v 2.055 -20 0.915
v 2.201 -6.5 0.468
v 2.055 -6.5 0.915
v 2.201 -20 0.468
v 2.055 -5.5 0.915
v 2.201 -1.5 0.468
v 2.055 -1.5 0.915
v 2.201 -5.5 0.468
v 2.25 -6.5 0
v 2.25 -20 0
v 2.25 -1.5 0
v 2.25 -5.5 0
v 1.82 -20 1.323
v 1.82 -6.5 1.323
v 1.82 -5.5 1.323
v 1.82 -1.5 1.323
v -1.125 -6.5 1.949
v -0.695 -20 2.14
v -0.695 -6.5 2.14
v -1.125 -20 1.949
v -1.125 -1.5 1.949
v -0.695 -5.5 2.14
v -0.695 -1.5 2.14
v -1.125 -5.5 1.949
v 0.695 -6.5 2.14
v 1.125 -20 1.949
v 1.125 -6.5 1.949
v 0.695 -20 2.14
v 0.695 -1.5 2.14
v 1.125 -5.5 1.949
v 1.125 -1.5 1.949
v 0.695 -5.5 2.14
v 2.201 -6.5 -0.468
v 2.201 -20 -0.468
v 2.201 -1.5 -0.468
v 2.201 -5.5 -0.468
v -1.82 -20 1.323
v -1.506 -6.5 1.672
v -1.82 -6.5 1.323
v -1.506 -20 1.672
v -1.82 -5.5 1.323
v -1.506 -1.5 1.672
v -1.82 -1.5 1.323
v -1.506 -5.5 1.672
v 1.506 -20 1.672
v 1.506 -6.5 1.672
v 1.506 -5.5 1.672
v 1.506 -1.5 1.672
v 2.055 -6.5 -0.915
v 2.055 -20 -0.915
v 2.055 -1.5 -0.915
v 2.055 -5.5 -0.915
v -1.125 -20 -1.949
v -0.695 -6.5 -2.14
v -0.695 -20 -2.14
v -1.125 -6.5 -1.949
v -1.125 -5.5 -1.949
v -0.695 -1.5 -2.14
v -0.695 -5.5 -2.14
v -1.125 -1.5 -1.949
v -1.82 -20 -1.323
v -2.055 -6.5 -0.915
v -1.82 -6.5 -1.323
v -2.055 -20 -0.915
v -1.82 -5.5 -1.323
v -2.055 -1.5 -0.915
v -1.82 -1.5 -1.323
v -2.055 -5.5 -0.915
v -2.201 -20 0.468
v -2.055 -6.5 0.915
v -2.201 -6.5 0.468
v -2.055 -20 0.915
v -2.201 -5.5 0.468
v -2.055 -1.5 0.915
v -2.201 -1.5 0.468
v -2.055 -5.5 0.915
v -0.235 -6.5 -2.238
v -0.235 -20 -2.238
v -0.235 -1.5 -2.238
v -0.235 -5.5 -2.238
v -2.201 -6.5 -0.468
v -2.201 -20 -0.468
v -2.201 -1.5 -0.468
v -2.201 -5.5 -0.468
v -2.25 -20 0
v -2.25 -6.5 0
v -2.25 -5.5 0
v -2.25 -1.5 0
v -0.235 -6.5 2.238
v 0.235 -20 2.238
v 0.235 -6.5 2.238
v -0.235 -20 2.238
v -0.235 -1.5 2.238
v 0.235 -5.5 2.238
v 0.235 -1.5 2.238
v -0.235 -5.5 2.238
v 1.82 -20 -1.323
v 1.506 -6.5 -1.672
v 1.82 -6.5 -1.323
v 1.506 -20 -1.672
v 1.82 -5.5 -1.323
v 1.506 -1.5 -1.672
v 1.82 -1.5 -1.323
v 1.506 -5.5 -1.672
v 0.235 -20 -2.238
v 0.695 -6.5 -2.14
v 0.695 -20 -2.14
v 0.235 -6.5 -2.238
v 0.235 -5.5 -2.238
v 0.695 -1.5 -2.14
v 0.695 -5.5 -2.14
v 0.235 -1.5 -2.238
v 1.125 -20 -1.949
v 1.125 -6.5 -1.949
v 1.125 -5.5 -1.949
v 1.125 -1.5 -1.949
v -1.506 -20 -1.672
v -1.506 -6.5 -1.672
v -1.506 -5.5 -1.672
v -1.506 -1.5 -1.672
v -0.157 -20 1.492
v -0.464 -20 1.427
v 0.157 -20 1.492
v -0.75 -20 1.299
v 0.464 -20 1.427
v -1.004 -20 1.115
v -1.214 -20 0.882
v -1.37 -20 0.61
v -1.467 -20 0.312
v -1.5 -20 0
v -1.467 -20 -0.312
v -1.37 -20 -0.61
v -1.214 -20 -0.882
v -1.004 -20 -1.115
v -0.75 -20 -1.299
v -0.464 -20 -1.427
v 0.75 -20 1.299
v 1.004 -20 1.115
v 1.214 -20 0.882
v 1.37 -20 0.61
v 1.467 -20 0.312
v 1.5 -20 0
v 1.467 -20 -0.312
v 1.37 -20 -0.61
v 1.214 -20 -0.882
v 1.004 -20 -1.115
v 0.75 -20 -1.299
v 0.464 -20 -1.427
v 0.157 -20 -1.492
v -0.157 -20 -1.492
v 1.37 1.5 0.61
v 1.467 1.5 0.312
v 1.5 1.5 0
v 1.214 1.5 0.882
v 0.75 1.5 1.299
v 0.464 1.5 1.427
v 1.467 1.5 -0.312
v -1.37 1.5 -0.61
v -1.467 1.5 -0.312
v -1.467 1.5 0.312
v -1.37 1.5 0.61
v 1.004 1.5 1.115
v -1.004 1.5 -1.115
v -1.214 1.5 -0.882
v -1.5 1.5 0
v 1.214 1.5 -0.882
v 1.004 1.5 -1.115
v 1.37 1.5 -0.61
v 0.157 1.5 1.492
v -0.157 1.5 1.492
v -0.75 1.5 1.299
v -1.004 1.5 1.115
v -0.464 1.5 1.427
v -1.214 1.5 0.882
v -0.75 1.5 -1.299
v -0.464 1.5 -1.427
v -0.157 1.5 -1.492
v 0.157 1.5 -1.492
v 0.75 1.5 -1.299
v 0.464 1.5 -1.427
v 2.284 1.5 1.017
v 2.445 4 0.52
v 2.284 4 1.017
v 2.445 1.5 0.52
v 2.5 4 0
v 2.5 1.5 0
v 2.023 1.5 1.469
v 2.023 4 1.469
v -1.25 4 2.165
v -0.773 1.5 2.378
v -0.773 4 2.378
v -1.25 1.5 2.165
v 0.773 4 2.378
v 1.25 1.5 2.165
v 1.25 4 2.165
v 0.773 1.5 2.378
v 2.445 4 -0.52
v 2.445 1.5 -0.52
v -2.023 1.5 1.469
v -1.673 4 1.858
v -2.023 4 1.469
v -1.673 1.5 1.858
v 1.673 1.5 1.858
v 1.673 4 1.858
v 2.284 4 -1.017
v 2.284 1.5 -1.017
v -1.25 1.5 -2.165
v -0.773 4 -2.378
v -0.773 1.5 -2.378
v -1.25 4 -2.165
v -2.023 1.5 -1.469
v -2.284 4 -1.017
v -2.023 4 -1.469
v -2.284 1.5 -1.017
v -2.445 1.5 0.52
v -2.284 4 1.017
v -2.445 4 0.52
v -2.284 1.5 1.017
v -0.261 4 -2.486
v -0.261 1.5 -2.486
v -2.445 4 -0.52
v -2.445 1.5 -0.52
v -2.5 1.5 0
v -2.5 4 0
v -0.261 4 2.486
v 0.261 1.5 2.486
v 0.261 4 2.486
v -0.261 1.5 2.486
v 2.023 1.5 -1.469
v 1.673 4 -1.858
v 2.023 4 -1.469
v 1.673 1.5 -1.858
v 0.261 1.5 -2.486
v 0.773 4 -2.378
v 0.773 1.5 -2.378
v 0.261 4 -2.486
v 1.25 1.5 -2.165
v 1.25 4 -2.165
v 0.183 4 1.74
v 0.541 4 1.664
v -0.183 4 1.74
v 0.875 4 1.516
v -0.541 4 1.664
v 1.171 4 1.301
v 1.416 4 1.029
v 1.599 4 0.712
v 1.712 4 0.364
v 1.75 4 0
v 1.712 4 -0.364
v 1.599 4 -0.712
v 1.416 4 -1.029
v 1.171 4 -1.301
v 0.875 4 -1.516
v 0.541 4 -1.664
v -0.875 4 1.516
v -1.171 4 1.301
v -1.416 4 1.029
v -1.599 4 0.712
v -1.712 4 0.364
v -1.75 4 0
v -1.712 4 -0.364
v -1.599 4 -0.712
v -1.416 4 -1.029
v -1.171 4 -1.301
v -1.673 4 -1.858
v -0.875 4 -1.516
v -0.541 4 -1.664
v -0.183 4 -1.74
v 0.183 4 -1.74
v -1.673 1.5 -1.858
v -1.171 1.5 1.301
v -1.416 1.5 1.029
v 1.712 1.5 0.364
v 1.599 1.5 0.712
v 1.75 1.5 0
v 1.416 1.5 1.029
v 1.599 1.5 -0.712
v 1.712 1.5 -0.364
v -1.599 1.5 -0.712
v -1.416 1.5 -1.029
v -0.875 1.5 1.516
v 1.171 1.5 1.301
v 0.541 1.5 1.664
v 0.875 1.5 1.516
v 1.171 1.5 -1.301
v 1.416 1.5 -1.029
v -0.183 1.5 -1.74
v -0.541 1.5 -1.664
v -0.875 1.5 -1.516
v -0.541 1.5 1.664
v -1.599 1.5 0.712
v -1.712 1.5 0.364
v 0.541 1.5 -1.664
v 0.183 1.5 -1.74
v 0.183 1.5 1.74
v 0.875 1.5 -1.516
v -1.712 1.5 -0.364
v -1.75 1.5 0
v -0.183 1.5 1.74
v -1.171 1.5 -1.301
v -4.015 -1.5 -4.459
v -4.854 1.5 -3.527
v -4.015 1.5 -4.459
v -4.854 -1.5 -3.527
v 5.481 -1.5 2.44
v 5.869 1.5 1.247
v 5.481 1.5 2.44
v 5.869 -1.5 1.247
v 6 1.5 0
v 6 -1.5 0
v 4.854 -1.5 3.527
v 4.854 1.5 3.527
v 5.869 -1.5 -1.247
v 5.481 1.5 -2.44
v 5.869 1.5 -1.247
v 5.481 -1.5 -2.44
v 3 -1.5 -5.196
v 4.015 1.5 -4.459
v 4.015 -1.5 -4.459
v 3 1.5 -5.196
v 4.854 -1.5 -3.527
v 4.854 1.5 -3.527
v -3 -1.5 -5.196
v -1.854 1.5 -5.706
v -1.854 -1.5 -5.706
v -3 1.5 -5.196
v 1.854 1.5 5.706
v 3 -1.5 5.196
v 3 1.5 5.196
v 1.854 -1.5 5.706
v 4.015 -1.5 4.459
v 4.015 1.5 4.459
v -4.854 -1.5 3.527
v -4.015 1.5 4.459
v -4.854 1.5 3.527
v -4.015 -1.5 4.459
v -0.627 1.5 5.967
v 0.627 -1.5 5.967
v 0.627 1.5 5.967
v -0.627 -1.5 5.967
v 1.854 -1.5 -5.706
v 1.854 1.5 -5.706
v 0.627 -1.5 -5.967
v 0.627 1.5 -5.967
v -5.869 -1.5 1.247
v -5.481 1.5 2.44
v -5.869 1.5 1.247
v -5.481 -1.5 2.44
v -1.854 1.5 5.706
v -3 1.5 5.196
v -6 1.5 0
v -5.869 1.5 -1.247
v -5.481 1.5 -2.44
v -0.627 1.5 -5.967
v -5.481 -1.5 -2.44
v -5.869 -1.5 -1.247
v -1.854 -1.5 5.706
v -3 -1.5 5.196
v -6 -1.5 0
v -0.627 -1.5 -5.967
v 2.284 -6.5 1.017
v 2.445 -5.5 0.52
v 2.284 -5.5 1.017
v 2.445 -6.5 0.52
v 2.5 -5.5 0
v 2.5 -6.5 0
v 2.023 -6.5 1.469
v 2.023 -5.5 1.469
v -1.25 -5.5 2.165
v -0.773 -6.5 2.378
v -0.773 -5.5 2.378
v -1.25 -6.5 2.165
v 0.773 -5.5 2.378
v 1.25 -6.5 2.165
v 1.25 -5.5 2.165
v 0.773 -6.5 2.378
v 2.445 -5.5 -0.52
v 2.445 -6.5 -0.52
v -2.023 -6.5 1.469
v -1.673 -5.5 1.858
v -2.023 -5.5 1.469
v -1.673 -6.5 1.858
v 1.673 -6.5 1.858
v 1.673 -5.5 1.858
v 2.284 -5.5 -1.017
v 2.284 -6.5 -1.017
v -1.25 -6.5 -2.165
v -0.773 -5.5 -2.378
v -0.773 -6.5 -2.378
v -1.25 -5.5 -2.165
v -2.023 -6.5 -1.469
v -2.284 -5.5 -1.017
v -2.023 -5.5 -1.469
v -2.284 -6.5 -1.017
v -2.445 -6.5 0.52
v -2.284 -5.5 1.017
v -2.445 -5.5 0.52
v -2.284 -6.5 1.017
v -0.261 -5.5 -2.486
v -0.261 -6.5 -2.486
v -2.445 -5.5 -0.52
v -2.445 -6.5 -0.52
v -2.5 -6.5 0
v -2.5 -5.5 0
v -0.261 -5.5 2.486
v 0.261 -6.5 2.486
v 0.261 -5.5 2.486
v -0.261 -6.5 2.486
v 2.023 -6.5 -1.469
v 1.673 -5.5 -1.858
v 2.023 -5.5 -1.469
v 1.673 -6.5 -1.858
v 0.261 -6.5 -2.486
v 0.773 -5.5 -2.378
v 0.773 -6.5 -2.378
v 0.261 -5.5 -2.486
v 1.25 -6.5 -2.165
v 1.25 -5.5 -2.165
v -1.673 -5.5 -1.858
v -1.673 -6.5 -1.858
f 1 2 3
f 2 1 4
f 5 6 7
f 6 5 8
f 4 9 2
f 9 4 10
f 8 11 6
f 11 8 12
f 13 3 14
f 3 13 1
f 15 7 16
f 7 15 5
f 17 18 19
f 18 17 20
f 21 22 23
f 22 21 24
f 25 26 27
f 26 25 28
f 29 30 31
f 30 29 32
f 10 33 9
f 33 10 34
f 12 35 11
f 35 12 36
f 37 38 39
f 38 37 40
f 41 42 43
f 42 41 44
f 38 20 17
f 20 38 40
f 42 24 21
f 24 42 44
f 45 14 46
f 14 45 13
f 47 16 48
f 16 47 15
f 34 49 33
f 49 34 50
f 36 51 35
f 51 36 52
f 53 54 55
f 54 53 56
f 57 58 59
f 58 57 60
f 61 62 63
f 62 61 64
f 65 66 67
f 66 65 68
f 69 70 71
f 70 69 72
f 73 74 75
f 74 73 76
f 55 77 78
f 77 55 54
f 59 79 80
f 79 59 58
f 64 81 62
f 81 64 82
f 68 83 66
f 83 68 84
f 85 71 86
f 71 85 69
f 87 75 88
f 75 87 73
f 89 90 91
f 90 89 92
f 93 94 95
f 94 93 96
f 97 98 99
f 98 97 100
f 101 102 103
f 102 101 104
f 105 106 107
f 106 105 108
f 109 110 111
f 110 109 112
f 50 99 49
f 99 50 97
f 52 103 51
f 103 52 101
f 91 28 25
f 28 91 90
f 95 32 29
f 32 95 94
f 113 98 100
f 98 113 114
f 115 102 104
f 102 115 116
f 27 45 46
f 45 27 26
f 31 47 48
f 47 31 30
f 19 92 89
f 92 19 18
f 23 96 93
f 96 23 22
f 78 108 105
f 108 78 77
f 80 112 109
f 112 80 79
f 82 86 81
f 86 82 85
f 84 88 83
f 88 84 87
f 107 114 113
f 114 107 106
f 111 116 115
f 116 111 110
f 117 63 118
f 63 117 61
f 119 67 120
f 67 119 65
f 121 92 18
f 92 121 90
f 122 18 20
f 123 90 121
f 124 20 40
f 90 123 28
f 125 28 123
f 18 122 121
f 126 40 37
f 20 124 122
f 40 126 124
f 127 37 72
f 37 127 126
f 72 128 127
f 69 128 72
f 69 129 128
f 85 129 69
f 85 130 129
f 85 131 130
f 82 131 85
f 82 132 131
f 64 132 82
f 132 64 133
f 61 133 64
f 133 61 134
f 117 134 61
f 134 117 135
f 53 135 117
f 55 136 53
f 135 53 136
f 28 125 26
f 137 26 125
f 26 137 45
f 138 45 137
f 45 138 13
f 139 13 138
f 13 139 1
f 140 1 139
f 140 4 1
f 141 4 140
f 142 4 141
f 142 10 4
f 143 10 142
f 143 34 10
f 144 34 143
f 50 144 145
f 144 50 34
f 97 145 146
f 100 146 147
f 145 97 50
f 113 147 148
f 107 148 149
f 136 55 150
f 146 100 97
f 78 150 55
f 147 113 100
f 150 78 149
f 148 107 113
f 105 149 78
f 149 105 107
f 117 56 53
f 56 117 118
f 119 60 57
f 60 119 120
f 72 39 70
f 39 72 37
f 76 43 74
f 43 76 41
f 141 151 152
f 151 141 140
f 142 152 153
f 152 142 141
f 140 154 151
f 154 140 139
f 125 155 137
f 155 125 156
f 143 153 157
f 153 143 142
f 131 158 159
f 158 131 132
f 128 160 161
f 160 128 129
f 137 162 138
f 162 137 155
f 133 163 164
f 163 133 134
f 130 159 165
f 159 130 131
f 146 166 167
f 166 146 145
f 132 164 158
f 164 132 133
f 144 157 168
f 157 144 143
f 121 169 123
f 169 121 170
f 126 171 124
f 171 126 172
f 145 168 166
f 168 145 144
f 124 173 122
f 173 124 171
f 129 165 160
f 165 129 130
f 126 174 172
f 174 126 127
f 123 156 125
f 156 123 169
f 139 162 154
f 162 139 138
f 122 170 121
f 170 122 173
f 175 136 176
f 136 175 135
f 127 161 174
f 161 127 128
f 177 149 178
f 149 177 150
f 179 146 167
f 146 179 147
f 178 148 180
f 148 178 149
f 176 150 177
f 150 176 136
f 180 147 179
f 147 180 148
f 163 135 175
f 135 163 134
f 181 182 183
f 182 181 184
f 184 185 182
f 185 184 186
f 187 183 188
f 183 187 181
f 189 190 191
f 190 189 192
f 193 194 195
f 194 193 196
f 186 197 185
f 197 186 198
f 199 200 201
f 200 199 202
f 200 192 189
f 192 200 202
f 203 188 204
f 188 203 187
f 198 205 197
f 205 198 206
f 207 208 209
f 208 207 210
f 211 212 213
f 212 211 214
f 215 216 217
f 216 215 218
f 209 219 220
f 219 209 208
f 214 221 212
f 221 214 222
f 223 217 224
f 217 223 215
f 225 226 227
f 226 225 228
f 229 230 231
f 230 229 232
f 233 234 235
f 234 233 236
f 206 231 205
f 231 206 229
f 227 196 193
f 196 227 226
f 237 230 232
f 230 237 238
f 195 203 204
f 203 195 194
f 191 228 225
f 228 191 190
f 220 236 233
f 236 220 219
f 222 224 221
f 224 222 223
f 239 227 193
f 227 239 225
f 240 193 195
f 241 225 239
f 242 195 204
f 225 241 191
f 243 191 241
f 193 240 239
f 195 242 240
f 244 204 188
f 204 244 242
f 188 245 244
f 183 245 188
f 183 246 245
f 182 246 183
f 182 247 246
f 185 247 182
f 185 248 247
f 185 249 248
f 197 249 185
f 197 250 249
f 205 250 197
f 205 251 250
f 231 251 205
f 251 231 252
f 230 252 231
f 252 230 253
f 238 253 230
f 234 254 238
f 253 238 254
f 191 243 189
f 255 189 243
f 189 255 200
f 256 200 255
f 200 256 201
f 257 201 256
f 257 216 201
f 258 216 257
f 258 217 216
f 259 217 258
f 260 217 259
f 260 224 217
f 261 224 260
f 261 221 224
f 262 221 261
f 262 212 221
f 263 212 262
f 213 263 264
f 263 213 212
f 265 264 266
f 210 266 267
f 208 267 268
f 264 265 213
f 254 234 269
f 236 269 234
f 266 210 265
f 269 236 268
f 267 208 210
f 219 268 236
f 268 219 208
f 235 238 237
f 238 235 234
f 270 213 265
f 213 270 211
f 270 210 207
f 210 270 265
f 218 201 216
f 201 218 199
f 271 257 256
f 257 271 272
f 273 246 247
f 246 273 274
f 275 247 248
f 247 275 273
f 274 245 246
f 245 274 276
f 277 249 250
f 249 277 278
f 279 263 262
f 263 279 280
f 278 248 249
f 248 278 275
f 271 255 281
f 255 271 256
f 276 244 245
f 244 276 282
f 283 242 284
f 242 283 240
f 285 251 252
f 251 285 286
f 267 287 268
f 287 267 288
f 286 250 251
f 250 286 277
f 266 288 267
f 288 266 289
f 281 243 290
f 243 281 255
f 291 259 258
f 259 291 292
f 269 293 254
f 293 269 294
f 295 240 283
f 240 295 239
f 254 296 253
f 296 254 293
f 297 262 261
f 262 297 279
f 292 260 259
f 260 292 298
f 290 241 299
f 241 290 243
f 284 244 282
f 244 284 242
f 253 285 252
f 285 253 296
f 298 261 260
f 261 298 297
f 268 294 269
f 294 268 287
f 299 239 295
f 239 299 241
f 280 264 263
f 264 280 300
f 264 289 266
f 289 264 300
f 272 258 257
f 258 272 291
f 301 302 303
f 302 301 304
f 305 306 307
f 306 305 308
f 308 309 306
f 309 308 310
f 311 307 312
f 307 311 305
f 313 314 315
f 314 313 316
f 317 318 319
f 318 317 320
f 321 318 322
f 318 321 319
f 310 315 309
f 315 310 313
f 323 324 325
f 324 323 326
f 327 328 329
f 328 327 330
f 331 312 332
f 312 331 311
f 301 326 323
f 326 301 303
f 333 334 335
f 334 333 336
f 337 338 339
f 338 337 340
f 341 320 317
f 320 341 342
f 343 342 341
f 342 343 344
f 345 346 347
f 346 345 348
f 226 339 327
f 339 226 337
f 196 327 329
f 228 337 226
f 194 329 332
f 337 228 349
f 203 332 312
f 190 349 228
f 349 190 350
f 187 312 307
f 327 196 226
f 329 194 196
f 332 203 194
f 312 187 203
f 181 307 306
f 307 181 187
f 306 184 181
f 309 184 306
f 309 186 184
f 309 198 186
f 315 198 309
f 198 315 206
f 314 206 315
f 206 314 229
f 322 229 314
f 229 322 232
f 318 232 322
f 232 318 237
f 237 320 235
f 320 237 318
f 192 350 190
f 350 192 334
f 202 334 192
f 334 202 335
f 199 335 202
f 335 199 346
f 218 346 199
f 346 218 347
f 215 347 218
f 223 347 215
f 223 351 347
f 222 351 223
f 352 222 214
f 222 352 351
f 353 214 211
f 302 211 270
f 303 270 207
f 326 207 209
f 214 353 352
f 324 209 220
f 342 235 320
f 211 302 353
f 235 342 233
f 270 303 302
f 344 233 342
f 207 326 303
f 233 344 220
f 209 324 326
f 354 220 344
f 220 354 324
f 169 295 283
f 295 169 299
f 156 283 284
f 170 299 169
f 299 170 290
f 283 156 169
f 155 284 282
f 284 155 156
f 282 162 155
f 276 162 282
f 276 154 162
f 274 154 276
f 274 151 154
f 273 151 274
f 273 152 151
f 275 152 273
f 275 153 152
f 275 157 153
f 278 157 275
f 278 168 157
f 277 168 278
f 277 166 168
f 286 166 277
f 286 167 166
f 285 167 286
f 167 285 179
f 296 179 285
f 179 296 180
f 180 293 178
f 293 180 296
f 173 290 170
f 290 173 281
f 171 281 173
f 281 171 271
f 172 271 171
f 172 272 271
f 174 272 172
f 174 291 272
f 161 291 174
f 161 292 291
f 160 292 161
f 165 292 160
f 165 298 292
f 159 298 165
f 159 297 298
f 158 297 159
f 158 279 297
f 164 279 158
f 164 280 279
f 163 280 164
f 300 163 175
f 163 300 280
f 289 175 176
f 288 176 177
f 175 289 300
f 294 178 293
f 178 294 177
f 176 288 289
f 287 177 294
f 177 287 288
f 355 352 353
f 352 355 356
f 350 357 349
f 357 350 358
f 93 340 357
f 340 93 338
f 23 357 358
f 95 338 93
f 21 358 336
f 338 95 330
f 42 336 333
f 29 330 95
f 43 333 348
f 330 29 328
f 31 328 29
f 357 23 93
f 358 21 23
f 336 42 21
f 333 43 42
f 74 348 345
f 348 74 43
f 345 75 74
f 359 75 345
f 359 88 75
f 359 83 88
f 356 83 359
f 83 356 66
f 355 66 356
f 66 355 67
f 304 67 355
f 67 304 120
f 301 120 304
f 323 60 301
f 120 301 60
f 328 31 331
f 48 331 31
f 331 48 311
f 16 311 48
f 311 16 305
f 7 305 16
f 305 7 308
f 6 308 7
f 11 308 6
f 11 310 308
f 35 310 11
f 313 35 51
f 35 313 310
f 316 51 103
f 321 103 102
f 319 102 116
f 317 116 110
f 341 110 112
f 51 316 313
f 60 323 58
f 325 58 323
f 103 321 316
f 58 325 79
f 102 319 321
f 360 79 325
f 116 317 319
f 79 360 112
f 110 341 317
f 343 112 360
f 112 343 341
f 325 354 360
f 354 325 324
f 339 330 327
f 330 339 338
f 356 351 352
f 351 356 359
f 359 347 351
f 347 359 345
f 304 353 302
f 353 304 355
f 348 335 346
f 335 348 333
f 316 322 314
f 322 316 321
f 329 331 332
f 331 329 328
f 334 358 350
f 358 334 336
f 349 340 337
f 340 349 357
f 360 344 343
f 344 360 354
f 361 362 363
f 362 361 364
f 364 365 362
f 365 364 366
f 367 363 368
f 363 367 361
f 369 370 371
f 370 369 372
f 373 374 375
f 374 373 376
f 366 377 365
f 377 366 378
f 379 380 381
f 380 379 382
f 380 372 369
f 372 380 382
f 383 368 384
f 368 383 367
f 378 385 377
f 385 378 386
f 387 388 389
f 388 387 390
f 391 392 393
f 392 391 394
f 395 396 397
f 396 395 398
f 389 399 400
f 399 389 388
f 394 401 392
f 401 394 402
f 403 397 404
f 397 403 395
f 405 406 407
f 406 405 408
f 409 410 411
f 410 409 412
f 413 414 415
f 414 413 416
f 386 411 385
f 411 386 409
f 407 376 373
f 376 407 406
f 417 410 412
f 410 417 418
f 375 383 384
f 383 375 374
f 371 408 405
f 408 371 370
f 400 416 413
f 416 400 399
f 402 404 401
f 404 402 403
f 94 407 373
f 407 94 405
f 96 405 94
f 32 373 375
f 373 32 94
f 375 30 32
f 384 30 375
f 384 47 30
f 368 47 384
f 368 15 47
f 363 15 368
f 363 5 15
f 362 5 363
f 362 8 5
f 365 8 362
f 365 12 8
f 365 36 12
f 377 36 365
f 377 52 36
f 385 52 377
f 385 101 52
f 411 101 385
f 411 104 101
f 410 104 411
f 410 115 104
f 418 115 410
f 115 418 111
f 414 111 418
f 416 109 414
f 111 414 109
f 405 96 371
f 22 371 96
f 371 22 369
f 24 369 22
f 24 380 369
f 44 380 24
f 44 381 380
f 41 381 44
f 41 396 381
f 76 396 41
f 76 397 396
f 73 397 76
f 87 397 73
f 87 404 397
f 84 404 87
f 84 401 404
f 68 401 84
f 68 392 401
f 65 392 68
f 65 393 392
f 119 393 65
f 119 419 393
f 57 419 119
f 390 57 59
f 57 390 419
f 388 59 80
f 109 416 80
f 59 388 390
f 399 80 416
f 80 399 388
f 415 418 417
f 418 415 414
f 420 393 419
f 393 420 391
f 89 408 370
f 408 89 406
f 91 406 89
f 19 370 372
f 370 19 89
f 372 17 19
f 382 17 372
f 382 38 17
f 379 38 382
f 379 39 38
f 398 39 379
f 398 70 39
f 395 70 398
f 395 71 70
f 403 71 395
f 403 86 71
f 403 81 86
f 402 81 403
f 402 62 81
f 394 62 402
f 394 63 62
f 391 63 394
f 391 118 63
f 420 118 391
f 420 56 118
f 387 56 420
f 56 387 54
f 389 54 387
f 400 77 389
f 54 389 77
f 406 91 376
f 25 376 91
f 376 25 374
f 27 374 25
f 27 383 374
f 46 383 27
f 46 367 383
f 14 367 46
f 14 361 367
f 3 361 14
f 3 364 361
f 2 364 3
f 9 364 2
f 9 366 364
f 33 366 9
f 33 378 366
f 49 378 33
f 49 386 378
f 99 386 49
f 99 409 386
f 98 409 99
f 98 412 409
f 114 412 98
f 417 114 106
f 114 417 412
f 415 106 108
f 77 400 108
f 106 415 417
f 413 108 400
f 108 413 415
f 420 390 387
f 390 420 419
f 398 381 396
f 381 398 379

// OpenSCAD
// Schlauchadapterer

Laenge = 20;

Leitung_oben = true;
Leitung_unten = true;
Mitte = true;
Haken1 = true;
Haken2 = false;


if (Leitung_oben) rotate([90,0,0]) Leitung_oben();
if (Leitung_oben) rotate([90,0,0]) Leitung_unten();
if (Mitte) rotate([90,0,0]) Mitte();
if (Haken1) rotate([90,0,0]) Haken1();
if (Haken2) rotate([90,0,0]) Haken2();

module Leitung_oben() {
    $fn=30;
    translate([0,0,Laenge/2])
    difference() {
        cylinder(d=4.5, h=Laenge, center=true);
        cylinder(d=3, h=Laenge+2, center=true);
    }
        
} 

module Leitung_unten() {
    $fn=30;
    translate([0,0,-4/2])
    difference() {
        cylinder(d=5, h=4, center=true);
        cylinder(d=3.5, h=4+2, center=true);
    }
        
} 


module Mitte() {

    difference() {
        $fn=30;
        // Mitte
        cylinder(d=12,h=3, center= true);
        cylinder(d=3, h=Laenge+2, center=true);
    }
}

module Haken1() {
    $fn=30;
    
    difference() {
        union() {
            translate([0,0,6])
            cylinder(d=5.0,h=1, center= true);
        }
        translate([0,0,Laenge/2])
        cylinder(d=3, h=Laenge+2, center=true);
    }
}

module Haken2() {
    $fn=30;
    
    difference() {
        union() {
            translate([0,0,9])
            cylinder(d=5.0,h=1, center= true);
        }
        translate([0,0,Laenge/2])
        cylinder(d=3, h=Laenge+2, center=true);
    }
}
